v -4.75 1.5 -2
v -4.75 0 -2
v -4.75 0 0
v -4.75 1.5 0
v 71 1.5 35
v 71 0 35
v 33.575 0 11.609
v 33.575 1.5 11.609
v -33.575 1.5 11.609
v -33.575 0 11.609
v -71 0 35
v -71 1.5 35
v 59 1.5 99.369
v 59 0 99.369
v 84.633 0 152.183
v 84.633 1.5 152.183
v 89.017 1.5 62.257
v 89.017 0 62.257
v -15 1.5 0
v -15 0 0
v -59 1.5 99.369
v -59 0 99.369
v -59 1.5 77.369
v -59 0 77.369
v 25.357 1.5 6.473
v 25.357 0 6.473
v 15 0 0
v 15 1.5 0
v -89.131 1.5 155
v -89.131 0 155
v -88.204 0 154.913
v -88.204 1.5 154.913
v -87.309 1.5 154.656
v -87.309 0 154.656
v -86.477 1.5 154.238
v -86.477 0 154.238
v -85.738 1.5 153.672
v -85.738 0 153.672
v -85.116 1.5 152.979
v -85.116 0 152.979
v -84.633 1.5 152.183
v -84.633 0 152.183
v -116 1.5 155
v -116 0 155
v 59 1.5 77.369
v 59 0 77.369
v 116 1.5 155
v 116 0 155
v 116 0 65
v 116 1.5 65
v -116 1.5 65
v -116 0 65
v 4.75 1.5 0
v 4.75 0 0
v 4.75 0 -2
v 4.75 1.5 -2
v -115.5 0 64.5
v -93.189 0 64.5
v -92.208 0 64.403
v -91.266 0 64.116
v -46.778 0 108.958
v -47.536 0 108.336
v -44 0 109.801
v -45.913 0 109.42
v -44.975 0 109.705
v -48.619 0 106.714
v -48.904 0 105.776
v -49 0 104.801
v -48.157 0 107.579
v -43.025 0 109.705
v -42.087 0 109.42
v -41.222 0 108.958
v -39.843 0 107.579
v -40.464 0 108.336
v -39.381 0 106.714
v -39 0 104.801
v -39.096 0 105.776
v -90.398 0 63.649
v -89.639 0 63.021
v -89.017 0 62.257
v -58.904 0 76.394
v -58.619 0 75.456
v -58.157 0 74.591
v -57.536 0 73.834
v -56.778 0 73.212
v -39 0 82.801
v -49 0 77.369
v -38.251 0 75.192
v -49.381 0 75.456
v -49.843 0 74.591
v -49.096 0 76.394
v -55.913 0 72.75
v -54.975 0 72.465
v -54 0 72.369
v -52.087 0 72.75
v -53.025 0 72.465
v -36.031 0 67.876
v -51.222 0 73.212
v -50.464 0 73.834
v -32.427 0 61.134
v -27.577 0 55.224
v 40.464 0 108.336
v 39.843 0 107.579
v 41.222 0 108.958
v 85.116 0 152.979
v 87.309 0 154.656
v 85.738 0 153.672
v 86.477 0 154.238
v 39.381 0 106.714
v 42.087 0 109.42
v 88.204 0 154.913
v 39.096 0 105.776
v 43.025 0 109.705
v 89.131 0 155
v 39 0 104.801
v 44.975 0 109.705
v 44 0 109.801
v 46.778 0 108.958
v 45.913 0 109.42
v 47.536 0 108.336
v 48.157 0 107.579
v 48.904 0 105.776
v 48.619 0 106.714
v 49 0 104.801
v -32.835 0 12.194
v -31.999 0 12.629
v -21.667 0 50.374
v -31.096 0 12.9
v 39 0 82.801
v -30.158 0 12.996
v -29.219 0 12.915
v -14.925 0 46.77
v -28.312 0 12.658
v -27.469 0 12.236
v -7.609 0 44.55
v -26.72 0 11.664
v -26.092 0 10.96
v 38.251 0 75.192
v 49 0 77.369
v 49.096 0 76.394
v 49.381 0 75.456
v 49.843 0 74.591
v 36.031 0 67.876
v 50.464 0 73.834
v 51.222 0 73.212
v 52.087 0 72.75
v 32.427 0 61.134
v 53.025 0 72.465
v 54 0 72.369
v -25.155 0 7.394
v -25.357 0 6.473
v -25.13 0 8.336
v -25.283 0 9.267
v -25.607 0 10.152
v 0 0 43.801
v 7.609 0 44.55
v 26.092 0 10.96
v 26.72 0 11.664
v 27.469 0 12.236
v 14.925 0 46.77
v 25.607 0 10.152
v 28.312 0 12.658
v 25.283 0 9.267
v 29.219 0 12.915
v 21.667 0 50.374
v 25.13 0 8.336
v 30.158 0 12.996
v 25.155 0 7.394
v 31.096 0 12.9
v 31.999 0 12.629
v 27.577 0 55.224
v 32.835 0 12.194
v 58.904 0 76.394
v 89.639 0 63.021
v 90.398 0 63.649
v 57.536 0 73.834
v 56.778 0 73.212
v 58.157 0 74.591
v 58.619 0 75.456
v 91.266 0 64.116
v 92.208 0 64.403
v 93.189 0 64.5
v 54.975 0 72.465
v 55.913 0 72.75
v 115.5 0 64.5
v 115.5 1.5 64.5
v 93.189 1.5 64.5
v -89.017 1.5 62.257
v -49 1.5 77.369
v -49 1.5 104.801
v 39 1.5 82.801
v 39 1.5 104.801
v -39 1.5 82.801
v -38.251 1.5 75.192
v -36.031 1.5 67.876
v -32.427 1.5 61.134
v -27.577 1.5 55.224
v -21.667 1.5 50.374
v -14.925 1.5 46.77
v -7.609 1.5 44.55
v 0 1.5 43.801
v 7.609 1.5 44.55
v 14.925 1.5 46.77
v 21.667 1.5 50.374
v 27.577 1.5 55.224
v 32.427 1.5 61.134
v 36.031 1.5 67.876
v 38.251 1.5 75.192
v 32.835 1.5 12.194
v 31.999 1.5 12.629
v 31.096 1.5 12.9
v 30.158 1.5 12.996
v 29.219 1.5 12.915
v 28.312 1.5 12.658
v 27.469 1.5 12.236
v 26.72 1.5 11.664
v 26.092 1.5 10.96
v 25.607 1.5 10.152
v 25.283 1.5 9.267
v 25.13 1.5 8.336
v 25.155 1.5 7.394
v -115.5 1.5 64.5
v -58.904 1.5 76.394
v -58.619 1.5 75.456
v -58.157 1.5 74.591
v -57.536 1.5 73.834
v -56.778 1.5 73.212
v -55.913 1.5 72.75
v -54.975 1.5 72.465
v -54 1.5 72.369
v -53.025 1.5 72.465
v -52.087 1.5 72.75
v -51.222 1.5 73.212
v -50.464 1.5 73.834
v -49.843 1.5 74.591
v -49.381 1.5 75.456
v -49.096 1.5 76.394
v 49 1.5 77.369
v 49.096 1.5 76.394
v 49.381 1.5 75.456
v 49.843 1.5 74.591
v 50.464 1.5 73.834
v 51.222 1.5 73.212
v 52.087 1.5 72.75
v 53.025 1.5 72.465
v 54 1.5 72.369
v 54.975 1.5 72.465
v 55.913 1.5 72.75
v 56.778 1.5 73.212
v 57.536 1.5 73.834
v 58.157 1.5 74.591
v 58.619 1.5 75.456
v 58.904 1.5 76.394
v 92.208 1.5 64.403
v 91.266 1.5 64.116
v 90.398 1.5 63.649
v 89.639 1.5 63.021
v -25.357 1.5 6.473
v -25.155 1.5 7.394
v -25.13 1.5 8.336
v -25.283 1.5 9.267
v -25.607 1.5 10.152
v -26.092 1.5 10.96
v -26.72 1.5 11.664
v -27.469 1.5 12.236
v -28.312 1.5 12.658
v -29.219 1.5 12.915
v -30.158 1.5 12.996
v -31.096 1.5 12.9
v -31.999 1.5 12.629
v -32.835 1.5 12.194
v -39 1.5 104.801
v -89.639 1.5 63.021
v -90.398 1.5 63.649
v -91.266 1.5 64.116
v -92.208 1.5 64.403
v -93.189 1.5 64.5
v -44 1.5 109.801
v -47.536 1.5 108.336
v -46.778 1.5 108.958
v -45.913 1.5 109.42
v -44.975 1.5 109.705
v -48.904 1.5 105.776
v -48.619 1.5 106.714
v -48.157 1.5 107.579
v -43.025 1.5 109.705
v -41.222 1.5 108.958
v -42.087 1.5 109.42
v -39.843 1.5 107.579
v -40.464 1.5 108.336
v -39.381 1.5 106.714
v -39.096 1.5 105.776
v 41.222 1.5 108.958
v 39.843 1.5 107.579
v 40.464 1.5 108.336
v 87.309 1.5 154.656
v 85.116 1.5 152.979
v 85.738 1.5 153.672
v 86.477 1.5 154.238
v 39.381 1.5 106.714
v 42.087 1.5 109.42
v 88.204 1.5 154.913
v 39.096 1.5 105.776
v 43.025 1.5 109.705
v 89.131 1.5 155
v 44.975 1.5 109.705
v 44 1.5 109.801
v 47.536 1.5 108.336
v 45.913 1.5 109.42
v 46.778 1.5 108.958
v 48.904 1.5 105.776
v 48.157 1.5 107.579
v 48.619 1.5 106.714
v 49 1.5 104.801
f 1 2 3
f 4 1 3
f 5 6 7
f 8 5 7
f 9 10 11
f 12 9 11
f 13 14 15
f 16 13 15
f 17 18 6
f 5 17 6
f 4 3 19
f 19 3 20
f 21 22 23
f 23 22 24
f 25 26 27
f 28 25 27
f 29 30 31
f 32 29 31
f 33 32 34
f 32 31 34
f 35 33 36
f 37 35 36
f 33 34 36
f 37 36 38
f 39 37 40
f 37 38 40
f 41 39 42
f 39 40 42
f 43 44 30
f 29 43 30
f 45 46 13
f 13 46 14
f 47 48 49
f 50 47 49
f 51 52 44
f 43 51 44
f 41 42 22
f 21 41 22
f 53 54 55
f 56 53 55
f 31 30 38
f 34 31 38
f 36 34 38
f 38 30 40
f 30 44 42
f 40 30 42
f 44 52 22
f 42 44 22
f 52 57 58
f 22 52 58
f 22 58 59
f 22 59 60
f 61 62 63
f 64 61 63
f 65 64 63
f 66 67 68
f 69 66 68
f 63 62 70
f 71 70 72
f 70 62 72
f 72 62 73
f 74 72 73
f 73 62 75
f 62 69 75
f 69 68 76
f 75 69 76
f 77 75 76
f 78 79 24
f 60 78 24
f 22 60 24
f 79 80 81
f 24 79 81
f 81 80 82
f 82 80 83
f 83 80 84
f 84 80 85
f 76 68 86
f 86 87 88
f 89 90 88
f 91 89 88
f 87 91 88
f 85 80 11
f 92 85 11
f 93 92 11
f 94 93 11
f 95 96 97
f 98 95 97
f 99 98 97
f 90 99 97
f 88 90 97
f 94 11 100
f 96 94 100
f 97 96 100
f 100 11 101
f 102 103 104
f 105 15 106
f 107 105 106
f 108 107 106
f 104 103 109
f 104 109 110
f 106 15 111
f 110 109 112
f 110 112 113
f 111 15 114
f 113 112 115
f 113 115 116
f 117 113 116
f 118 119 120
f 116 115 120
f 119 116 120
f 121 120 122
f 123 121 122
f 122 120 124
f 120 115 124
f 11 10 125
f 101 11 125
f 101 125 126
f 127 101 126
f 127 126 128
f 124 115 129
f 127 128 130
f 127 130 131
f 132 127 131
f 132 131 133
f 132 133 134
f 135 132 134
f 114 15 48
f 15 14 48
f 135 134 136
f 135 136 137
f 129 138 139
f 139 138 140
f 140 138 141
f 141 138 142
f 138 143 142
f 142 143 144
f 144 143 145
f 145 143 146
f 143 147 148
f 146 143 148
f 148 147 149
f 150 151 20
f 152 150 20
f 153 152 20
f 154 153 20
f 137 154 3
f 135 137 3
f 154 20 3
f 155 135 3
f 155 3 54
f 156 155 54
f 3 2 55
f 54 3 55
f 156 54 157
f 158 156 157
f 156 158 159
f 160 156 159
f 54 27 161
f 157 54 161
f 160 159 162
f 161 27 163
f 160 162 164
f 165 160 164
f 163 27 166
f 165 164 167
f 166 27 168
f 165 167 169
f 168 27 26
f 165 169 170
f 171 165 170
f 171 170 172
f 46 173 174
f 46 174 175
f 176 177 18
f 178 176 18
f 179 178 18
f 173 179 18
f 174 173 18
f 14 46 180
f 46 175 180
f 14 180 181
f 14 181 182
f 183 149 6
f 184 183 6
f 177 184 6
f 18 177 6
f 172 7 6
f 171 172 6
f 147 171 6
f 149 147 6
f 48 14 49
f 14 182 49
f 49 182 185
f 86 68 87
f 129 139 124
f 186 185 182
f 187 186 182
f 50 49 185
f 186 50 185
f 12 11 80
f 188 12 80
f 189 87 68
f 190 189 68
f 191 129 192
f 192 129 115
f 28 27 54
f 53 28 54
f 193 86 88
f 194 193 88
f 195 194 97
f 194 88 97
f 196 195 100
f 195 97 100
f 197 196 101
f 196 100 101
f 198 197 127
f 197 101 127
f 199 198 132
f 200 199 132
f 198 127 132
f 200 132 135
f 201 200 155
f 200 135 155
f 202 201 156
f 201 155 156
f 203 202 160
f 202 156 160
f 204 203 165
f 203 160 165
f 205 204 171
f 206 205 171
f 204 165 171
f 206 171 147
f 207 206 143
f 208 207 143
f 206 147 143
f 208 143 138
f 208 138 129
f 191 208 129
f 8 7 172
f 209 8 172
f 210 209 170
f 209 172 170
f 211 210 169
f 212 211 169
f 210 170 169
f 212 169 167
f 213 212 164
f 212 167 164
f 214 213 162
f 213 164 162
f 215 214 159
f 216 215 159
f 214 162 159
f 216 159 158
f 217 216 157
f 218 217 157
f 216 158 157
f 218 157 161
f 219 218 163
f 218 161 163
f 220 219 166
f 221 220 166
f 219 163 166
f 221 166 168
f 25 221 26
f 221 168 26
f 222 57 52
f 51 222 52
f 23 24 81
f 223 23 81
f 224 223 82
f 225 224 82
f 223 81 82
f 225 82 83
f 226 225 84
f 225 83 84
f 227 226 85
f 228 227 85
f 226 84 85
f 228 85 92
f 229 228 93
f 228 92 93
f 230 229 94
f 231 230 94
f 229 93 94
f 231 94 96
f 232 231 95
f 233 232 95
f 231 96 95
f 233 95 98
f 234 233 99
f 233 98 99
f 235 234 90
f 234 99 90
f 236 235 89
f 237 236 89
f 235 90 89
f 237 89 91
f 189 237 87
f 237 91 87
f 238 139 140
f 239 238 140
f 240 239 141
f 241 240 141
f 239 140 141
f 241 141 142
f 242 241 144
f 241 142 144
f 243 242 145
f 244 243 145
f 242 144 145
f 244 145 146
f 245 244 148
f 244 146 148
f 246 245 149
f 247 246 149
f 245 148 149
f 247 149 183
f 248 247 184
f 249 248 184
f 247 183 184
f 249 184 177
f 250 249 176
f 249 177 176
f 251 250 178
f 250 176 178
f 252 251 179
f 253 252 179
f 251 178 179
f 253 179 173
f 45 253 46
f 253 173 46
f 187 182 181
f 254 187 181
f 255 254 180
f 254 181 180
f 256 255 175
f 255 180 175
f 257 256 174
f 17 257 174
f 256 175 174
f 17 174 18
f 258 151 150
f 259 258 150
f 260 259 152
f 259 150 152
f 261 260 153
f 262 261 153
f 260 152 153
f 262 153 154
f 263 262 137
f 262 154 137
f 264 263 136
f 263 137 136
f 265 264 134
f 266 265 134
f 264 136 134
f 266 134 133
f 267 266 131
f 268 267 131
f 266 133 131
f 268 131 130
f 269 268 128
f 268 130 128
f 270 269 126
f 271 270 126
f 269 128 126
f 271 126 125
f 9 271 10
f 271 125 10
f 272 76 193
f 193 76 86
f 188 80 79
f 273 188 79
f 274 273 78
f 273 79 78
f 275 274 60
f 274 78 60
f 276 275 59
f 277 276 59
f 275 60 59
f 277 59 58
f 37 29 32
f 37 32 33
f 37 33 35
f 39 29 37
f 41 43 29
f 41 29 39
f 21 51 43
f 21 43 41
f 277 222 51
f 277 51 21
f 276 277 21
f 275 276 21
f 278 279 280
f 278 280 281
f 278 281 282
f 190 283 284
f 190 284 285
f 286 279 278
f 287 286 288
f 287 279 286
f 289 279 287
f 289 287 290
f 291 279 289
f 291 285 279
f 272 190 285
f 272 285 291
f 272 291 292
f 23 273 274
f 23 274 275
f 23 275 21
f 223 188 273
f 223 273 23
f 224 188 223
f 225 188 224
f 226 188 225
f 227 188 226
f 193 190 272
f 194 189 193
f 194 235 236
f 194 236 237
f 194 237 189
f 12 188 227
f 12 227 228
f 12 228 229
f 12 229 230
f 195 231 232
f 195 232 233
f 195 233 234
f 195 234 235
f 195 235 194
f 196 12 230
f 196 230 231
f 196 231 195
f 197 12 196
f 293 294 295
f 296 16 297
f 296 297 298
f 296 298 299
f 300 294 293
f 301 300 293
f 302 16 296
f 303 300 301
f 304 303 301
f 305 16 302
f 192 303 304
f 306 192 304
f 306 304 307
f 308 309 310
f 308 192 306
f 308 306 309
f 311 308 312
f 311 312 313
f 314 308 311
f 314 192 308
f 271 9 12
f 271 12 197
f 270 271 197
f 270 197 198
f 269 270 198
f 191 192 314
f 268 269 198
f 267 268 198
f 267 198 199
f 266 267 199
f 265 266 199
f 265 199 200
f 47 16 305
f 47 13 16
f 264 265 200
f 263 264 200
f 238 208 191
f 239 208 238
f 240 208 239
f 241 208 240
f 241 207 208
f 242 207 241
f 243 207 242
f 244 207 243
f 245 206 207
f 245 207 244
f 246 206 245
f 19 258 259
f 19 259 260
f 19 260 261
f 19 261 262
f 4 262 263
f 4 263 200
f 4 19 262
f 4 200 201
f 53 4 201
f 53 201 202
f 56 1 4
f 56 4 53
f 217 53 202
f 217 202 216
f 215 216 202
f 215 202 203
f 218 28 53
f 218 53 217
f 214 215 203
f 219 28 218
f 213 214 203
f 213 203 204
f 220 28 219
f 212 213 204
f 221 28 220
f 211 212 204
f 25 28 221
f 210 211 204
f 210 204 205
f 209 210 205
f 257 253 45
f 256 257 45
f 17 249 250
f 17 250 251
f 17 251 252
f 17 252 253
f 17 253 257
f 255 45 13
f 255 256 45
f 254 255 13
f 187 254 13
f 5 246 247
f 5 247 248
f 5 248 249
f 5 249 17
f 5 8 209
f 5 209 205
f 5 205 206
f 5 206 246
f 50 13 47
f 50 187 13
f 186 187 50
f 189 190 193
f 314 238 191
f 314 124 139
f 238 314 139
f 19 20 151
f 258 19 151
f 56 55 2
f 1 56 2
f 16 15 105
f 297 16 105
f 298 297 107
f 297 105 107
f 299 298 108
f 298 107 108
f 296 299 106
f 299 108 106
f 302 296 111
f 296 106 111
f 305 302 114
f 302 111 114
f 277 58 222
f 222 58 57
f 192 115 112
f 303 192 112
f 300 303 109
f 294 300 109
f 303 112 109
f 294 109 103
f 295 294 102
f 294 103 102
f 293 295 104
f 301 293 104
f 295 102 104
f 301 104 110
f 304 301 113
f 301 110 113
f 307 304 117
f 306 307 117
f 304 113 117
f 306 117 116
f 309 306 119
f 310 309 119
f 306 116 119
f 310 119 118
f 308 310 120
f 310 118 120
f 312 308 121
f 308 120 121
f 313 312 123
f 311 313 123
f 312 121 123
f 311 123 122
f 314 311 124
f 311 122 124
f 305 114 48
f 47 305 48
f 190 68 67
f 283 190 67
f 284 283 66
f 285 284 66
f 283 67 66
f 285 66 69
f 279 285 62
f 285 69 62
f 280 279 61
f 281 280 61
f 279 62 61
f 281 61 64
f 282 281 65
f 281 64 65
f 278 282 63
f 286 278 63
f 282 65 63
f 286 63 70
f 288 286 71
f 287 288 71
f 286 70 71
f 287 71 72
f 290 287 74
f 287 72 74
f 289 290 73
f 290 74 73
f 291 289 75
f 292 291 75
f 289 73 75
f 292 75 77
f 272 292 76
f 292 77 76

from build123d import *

# Parameters (mm, degrees)
BOSS_EXTRUDE1_DEPTH = 1.5


with BuildPart() as part:
    # Sketch1 → Boss-Extrude1 (new body)
    with BuildSketch(Plane(origin=(0, 0, 0), x_dir=(1, 0, 0), z_dir=(0, 1, 0))):
        with BuildLine():
            Line((15, 0), (4.75, 0))
            Line((4.75, 0), (4.75, 2))
            Line((4.75, 2), (-4.75, 2))
            Line((-4.75, 2), (-4.75, 0))
            Line((-4.75, 0), (-15, 0))
            Line((-15, 0), (-25.356589319, -6.472868325))
            ThreePointArc((-25.356589319, -6.472868325), (-27.468846161, -12.236329652), (-33.575081251, -11.609425782))
            Line((-33.575081251, -11.609425782), (-71, -35))
            Line((-71, -35), (-89.017448096, -62.257165069))
            ThreePointArc((-89.017448096, -62.257165069), (-90.820615058, -63.903738488), (-93.18854397, -64.5))
            Line((-93.18854397, -64.5), (-115.5, -64.5))
            Line((-115.5, -64.5), (-116, -65))
            Line((-116, -65), (-116, -155))
            Line((-116, -155), (-89.131068486, -155))
            ThreePointArc((-89.131068486, -155), (-86.477376272, -154.23767833), (-84.632870889, -152.183167051))
            Line((-84.632870889, -152.183167051), (-59, -99.369197466))
            Line((-59, -99.369197466), (-59, -77.369197466))
            ThreePointArc((-59, -77.369197466), (-54, -72.369197466), (-49, -77.369197466))
            Line((-49, -77.369197466), (-49, -104.800858216))
            ThreePointArc((-49, -104.800858216), (-44, -109.800858216), (-39, -104.800858216))
            Line((-39, -104.800858216), (-39, -82.800858216))
            ThreePointArc((-39, -82.800858216), (0, -43.800858216), (39, -82.800858216))
            Line((39, -82.800858216), (39, -104.800858216))
            ThreePointArc((39, -104.800858216), (44, -109.800858216), (49, -104.800858216))
            Line((49, -104.800858216), (49, -77.369197466))
            ThreePointArc((49, -77.369197466), (54, -72.369197466), (59, -77.369197466))
            Line((59, -77.369197466), (59, -99.369197466))
            Line((59, -99.369197466), (84.632870889, -152.183167051))
            ThreePointArc((84.632870889, -152.183167051), (86.477376272, -154.23767833), (89.131068486, -155))
            Line((89.131068486, -155), (116, -155))
            Line((116, -155), (116, -65))
            Line((116, -65), (115.5, -64.5))
            Line((115.5, -64.5), (93.18854397, -64.5))
            ThreePointArc((93.18854397, -64.5), (90.820615058, -63.903738488), (89.017448096, -62.257165069))
            Line((89.017448096, -62.257165069), (71, -35))
            Line((71, -35), (33.575081251, -11.609425782))
            ThreePointArc((33.575081251, -11.609425782), (27.468846161, -12.236329652), (25.356589319, -6.472868325))
            Line((25.356589319, -6.472868325), (15, 0))
        make_face()
    extrude(amount=BOSS_EXTRUDE1_DEPTH)


solid = part.part
